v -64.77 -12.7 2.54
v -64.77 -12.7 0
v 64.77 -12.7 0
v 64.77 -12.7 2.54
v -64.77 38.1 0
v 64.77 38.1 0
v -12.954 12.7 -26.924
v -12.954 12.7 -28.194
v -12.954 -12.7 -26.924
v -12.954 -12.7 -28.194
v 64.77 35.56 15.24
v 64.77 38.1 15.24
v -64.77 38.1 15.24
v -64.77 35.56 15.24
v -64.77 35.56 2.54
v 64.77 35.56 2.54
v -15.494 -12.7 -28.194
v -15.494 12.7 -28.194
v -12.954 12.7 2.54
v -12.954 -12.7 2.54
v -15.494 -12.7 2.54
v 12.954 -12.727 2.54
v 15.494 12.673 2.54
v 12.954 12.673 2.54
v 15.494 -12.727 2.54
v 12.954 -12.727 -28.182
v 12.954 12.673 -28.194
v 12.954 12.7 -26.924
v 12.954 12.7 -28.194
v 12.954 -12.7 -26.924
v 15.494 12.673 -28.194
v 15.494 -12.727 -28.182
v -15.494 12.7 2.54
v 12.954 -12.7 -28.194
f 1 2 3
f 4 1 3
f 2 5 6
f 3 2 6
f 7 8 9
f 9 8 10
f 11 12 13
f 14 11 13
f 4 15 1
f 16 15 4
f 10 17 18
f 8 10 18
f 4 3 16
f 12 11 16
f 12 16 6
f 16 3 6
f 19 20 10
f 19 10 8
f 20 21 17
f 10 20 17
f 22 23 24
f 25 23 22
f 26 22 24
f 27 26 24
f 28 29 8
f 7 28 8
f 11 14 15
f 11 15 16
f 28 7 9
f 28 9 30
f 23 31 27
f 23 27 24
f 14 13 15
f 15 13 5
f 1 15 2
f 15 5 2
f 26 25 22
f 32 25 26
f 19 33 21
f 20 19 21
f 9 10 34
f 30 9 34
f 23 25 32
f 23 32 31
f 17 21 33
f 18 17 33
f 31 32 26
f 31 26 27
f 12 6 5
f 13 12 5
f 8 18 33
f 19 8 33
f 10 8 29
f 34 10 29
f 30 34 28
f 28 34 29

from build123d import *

# Parameters (mm, degrees)
F8_DEPTH  = 1.27
F9_DEPTH  = 2.54
F10_DEPTH = 2.54
F11_DEPTH = 2.54
F13_DEPTH = 2.54


# Not quite as in the source:
# - a feature names something its author has since deleted; it is built from what else it names


with BuildPart() as f8:
    # F3 (on offset) → F8 (new body)
    with BuildSketch(Plane.XY.offset(-28.194)):
        Polygon((0, -12.7), (0, 0), (0, 12.7), (-12.954, 12.7), (-12.954, -12.7), align=None)
        Polygon((0, 12.7), (0, 0), (0, -12.7), (12.954, -12.7), (12.954, 12.7), align=None)
    extrude(amount=F8_DEPTH)


with BuildPart() as f9:
    # F7 (on offset) → F9 (new body)
    with BuildSketch(Plane.YZ.offset(-15.494)):
        Polygon((12.7, 2.54), (0, 2.54), (-12.7, 2.54), (-12.7, -28.194), (12.7, -28.194), align=None)
    extrude(amount=F9_DEPTH)


with BuildPart() as f10:
    # F5 (on offset) → F10 (new body)
    with BuildSketch(Plane.YZ.offset(15.494)):
        Polygon((12.6734433368, 2.54), (-12.7265510293, 2.54), (-12.7265510293, -28.1820375444), (12.6734433368, -28.194), align=None)
    extrude(amount=-F10_DEPTH)


with BuildPart() as f11:
    # F0 (on Top) → F11 (new body)
    with BuildSketch(Plane.XY):
        Polygon((-64.77, 38.1), (-64.77, 0), (-64.77, -12.7), (64.77, -12.7), (64.77, 38.1), align=None)
    extrude(amount=F11_DEPTH)

    # F12 (on offset) → F13 (join)
    with BuildSketch(Plane.XZ.offset(-38.1)):
        Polygon((-64.77, 0), (0, 0), (64.77, 0), (64.77, 15.24), (-64.77, 15.24), align=None)
    extrude(amount=F13_DEPTH)


solid = Compound([f8.part, f9.part, f10.part, f11.part])
